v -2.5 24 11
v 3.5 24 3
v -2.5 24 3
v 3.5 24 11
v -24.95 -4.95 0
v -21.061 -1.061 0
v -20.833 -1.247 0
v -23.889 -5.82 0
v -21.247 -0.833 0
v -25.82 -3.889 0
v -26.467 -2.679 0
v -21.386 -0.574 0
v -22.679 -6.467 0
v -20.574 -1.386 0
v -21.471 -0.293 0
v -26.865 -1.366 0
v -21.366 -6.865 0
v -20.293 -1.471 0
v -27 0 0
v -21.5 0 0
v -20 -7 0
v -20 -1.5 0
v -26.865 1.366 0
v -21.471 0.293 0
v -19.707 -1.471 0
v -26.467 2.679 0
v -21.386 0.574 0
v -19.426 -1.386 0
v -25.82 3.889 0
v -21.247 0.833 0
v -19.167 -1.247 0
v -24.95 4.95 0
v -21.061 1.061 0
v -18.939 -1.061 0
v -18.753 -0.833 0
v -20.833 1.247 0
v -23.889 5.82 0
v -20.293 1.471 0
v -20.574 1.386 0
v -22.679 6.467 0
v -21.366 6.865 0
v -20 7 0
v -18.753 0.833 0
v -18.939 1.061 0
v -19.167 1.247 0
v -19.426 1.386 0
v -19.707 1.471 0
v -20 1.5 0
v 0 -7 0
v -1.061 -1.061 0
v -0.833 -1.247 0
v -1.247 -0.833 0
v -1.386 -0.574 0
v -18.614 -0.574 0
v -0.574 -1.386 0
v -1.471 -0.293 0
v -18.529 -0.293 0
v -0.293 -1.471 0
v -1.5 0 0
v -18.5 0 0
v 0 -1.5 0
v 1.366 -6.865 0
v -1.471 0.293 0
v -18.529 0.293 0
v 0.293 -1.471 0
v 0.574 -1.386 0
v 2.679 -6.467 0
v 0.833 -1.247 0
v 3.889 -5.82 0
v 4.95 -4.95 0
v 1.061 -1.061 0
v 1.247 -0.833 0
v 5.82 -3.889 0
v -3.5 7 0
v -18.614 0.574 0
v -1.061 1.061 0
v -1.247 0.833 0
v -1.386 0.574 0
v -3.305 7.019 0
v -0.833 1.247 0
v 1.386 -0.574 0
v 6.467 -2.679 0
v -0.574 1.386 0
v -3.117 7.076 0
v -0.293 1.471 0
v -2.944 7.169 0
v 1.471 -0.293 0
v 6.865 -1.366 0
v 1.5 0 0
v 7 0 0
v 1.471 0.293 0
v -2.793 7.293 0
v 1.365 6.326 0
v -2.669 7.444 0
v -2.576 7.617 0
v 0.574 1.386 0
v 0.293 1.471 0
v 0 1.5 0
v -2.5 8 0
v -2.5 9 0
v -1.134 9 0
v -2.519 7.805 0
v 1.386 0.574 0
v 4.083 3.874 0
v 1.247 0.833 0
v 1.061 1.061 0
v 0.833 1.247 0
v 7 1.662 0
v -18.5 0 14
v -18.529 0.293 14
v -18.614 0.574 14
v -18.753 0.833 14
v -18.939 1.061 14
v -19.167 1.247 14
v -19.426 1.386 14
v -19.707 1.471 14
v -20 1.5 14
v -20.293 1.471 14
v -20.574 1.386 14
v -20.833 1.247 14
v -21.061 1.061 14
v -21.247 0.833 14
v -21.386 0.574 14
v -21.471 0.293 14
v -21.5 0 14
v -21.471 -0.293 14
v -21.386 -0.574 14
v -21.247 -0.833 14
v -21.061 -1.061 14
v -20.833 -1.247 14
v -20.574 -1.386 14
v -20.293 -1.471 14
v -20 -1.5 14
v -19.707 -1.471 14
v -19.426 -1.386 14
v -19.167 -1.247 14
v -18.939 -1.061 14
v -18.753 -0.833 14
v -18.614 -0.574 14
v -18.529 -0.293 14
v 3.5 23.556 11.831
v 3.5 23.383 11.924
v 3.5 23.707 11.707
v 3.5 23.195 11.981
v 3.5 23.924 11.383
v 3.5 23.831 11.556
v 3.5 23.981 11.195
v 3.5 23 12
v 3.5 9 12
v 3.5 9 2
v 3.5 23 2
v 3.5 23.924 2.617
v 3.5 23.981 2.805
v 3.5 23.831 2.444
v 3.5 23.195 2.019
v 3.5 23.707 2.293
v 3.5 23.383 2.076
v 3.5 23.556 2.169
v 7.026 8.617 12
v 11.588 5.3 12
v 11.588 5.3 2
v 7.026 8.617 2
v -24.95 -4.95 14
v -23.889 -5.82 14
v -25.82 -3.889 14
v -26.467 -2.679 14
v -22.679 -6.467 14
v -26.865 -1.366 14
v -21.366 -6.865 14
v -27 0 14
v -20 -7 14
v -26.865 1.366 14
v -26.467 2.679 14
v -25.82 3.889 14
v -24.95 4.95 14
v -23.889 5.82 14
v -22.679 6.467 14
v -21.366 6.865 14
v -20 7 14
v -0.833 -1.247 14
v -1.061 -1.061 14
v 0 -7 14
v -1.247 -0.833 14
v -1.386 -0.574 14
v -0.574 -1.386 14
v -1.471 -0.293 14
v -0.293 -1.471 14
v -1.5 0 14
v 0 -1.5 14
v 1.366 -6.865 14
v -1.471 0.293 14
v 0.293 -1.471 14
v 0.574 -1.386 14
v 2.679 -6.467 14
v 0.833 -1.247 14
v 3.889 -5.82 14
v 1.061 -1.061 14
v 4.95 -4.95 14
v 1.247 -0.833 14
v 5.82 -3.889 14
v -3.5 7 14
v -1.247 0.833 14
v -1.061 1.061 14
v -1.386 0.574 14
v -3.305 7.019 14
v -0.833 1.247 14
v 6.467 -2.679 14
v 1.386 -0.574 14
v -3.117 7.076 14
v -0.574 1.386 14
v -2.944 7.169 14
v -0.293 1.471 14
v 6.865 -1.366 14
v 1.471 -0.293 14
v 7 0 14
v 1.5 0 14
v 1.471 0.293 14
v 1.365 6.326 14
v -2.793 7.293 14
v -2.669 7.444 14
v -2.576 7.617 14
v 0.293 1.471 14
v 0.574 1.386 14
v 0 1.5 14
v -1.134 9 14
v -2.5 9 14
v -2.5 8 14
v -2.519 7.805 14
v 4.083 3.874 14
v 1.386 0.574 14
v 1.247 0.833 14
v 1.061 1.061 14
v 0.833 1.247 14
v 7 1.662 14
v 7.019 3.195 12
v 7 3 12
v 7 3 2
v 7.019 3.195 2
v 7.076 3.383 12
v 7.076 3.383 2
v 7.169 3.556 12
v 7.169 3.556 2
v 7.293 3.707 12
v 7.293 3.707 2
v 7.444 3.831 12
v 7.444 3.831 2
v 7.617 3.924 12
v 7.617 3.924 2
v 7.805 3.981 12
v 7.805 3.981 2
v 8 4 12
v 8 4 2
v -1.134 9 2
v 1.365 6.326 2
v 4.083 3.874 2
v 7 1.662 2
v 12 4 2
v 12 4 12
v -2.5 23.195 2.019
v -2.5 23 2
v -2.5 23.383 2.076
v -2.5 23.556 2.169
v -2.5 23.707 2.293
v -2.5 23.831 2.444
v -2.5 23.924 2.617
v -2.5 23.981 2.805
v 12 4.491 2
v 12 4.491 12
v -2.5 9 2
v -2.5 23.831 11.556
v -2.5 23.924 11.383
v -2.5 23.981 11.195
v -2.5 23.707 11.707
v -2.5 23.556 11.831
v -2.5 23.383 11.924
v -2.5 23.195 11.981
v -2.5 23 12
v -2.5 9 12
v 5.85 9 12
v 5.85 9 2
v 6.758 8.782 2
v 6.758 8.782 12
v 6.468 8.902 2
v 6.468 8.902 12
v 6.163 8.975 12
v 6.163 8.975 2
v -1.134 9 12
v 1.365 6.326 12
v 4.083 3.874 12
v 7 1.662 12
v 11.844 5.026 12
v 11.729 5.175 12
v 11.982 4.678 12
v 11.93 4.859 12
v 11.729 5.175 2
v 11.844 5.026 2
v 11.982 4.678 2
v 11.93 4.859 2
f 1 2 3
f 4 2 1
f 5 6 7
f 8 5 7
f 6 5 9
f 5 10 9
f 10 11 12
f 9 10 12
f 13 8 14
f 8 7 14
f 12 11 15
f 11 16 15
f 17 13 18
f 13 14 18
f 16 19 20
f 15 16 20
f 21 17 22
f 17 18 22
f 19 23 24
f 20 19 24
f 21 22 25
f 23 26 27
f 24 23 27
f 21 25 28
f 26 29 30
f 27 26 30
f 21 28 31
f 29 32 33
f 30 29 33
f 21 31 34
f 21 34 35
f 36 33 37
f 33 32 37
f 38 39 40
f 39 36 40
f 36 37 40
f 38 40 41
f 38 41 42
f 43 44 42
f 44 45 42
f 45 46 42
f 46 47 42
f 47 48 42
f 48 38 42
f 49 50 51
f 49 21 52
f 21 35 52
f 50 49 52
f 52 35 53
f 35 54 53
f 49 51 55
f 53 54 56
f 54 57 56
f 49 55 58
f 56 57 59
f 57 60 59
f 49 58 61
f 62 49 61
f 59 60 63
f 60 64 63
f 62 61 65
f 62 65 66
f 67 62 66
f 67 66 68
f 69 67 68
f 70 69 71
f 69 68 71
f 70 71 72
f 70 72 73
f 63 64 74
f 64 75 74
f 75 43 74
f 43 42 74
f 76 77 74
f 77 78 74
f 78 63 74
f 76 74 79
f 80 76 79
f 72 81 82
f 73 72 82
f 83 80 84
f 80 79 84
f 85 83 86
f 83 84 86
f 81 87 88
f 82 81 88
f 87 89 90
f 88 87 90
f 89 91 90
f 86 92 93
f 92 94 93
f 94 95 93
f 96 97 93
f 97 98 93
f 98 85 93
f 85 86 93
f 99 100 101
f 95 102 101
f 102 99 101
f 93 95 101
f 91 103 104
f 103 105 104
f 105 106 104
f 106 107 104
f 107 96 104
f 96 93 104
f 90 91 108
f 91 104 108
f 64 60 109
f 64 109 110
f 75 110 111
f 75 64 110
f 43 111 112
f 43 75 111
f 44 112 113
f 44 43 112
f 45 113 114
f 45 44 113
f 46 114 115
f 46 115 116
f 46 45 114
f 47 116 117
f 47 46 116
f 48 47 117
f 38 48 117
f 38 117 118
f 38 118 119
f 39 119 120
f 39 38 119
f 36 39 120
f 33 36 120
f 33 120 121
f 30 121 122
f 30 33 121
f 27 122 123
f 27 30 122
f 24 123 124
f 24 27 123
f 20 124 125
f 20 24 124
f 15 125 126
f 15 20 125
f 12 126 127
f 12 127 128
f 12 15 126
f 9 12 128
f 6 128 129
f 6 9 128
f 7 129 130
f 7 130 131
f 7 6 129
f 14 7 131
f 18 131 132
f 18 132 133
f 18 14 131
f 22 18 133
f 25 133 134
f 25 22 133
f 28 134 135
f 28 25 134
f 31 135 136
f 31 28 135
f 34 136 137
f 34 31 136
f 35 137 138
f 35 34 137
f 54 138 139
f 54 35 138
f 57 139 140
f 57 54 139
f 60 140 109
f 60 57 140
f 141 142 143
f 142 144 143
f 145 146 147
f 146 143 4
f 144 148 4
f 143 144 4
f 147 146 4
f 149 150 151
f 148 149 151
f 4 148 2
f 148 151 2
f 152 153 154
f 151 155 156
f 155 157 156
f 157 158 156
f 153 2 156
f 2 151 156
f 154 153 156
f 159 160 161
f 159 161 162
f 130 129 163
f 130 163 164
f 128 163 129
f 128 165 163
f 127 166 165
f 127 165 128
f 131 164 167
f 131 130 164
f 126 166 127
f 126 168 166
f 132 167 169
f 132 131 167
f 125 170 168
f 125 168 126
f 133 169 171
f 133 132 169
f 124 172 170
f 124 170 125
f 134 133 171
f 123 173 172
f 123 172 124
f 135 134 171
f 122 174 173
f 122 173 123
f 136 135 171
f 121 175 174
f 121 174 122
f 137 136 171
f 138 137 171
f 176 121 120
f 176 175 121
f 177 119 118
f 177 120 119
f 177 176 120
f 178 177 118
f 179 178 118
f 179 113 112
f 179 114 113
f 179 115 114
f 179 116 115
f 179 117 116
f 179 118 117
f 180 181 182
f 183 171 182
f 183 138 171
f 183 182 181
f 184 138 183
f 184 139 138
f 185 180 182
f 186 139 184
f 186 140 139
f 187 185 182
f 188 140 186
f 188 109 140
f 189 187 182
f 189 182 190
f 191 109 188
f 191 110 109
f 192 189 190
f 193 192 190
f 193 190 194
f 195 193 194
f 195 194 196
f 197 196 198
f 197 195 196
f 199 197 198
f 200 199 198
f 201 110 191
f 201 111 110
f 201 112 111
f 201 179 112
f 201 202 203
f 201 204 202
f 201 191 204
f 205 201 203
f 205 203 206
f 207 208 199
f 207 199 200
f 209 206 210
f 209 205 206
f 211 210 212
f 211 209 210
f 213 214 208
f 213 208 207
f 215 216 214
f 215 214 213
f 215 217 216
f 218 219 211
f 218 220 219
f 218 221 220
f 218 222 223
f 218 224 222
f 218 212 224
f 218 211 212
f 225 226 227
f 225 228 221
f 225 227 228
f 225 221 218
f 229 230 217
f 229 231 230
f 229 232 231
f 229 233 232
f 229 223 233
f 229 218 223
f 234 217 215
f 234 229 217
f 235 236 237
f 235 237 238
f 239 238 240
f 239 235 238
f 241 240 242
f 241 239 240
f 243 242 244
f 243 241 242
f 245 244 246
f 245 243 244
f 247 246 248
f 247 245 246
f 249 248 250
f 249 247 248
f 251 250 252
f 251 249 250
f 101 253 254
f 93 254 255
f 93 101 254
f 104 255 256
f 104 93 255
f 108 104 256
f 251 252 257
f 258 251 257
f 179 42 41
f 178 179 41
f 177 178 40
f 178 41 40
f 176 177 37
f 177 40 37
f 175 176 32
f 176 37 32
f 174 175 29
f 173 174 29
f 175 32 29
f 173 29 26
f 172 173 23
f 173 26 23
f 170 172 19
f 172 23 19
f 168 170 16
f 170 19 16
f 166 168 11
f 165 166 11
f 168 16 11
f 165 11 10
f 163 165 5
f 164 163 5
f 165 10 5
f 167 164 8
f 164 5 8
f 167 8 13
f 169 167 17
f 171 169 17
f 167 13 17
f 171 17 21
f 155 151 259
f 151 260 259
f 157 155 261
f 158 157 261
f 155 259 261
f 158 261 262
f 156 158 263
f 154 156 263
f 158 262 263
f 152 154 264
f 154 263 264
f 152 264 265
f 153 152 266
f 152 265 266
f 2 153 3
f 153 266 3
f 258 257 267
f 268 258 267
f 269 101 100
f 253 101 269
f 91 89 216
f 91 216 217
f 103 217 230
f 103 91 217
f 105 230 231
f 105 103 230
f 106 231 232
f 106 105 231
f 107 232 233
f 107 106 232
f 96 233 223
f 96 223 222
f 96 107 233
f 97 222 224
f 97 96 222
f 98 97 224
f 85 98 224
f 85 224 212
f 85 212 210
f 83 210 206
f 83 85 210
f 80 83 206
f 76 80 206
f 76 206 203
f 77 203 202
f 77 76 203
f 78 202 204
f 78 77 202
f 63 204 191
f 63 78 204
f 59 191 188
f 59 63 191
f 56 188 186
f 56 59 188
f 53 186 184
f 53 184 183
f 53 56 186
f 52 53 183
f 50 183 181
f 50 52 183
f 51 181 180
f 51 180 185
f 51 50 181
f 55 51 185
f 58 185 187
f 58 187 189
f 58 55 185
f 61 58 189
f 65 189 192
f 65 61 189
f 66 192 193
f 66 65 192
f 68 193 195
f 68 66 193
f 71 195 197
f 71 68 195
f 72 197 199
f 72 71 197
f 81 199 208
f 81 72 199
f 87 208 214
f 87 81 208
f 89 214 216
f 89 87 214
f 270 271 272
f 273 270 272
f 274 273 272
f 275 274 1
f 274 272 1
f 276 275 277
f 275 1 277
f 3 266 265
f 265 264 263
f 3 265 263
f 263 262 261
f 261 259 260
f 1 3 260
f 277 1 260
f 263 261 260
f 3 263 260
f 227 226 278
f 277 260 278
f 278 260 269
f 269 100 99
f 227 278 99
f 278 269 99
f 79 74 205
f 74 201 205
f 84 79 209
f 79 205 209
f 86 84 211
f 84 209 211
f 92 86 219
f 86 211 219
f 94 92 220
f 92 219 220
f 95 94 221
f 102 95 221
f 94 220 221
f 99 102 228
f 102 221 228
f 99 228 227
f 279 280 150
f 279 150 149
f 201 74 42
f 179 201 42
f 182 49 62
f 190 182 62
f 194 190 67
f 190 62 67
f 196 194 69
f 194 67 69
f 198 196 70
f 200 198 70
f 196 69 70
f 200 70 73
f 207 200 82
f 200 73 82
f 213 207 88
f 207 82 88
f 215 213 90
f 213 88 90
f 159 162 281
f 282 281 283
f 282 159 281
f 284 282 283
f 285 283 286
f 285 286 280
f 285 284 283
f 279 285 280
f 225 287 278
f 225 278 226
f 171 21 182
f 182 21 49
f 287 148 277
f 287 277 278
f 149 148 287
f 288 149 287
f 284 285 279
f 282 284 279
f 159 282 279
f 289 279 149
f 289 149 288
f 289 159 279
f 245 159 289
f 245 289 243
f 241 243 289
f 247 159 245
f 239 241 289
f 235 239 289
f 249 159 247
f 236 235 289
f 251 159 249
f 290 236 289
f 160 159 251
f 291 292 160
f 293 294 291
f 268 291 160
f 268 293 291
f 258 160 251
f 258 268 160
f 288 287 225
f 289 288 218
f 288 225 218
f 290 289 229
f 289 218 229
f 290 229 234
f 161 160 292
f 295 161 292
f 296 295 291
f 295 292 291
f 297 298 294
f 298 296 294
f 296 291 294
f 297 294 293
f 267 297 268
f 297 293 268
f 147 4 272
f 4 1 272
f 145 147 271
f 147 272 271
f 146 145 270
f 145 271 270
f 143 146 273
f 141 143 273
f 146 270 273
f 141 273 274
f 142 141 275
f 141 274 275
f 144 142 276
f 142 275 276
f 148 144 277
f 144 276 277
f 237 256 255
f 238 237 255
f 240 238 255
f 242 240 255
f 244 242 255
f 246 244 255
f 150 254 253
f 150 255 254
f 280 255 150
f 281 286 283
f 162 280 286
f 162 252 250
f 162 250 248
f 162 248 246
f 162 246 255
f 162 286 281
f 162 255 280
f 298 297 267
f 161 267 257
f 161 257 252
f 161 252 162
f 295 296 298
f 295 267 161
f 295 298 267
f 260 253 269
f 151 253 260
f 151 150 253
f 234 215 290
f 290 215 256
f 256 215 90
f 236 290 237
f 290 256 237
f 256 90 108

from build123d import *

# Parameters (mm, degrees)
SKETCH_1_R          = 7
SKETCH_1_R_2        = 1.5
EXTRUDE_1_DEPTH     = 14
FILLET_2_R          = 1
FILLET_4_R          = 2
FILLET_5_R          = 1
CUT_EXTRUDE_1_DEPTH = 10
FILLET_6_R          = 1
SKETCH_4_R          = 43
SKETCH_4_W          = 56
SKETCH_4_H          = 56
CUT_EXTRUDE_2_DEPTH = 2


with BuildPart() as part:
    # 草图1 → 凸台-拉伸1 (new body)
    # profile 1 of 3: a face of its own
    with BuildSketch(Plane.XY):
        with BuildLine():
            Line((-2.5, 7), (-20, 7))
            ThreePointArc((-20, 7), (-15.050252532, 4.949747468), (-13, 0))
            ThreePointArc((-13, 0), (-15.050252532, -4.949747468), (-20, -7))
            Line((-20, -7), (0, -7))
            ThreePointArc((0, -7), (-4.949747468, 4.949747468), (7, 0))
            Line((7, 0), (7, 4))
            Line((7, 4), (12, 4))
            Line((12, 4), (12, 5))
            Line((12, 5), (6.5, 9))
            Line((6.5, 9), (3.5, 9))
            Line((3.5, 9), (3.5, 26))
            Line((3.5, 26), (-2.5, 26))
            Line((-2.5, 26), (-2.5, 7))
        make_face()
    # profile 2 of 3: a face of its own
    with BuildSketch(Plane.XY):
        Circle(SKETCH_1_R)
        Circle(SKETCH_1_R_2, mode=Mode.SUBTRACT)
    # profile 3 of 3: a face of its own
    with BuildSketch(Plane.XY):
        with Locations((-20, 0)):
            Circle(SKETCH_1_R)
        with Locations((-20, 0)):
            Circle(SKETCH_1_R_2, mode=Mode.SUBTRACT)
    extrude(amount=EXTRUDE_1_DEPTH)

    # 圆角2
    fillet_2_edges = [part.edges().sort_by_distance(p)[0] for p in [
        (-2.5, 7, 7),
        (7, 4, 7),
    ]]
    fillet(fillet_2_edges, radius=FILLET_2_R)

    # 圆角4
    fillet_4_edges = [part.edges().sort_by_distance(p)[0] for p in [
        (6.5, 9, 7),
    ]]
    fillet(fillet_4_edges, radius=FILLET_4_R)

    # 圆角5
    fillet_5_edges = [part.edges().sort_by_distance(p)[0] for p in [
        (12, 5, 7),
    ]]
    fillet(fillet_5_edges, radius=FILLET_5_R)

    # 草图2 → 切除-拉伸1 (cut)
    with BuildSketch(Plane(origin=(3.5, 0, 0), x_dir=(0, 0, -1), z_dir=(1, 0, 0))):
        Polygon((-12, 9), (-14, 9), (-14, 26), (0, 26), (0, 9), (-2, 9), (-2, 24), (-12, 24), align=None)
    extrude(amount=-CUT_EXTRUDE_1_DEPTH, mode=Mode.SUBTRACT)

    # 圆角6
    fillet_6_edges = [part.edges().sort_by_distance(p)[0] for p in [
        (0.5, 24, 12),
        (0.5, 24, 2),
    ]]
    fillet(fillet_6_edges, radius=FILLET_6_R)

    # 草图4 → 切除-拉伸2 (cut)
    with BuildSketch(Plane.XY.offset(14)):
        with Locations((31.5, 37)):
            Circle(SKETCH_4_R)
        with Locations((31.5, 37)):
            Rectangle(SKETCH_4_W, SKETCH_4_H, mode=Mode.SUBTRACT)
    cut_extrude_2 = extrude(amount=-CUT_EXTRUDE_2_DEPTH, mode=Mode.SUBTRACT)

    # 镜向1: 切除-拉伸2 across plane
    add(cut_extrude_2.mirror(Plane.XY.offset(7)), mode=Mode.SUBTRACT)


solid = part.part
